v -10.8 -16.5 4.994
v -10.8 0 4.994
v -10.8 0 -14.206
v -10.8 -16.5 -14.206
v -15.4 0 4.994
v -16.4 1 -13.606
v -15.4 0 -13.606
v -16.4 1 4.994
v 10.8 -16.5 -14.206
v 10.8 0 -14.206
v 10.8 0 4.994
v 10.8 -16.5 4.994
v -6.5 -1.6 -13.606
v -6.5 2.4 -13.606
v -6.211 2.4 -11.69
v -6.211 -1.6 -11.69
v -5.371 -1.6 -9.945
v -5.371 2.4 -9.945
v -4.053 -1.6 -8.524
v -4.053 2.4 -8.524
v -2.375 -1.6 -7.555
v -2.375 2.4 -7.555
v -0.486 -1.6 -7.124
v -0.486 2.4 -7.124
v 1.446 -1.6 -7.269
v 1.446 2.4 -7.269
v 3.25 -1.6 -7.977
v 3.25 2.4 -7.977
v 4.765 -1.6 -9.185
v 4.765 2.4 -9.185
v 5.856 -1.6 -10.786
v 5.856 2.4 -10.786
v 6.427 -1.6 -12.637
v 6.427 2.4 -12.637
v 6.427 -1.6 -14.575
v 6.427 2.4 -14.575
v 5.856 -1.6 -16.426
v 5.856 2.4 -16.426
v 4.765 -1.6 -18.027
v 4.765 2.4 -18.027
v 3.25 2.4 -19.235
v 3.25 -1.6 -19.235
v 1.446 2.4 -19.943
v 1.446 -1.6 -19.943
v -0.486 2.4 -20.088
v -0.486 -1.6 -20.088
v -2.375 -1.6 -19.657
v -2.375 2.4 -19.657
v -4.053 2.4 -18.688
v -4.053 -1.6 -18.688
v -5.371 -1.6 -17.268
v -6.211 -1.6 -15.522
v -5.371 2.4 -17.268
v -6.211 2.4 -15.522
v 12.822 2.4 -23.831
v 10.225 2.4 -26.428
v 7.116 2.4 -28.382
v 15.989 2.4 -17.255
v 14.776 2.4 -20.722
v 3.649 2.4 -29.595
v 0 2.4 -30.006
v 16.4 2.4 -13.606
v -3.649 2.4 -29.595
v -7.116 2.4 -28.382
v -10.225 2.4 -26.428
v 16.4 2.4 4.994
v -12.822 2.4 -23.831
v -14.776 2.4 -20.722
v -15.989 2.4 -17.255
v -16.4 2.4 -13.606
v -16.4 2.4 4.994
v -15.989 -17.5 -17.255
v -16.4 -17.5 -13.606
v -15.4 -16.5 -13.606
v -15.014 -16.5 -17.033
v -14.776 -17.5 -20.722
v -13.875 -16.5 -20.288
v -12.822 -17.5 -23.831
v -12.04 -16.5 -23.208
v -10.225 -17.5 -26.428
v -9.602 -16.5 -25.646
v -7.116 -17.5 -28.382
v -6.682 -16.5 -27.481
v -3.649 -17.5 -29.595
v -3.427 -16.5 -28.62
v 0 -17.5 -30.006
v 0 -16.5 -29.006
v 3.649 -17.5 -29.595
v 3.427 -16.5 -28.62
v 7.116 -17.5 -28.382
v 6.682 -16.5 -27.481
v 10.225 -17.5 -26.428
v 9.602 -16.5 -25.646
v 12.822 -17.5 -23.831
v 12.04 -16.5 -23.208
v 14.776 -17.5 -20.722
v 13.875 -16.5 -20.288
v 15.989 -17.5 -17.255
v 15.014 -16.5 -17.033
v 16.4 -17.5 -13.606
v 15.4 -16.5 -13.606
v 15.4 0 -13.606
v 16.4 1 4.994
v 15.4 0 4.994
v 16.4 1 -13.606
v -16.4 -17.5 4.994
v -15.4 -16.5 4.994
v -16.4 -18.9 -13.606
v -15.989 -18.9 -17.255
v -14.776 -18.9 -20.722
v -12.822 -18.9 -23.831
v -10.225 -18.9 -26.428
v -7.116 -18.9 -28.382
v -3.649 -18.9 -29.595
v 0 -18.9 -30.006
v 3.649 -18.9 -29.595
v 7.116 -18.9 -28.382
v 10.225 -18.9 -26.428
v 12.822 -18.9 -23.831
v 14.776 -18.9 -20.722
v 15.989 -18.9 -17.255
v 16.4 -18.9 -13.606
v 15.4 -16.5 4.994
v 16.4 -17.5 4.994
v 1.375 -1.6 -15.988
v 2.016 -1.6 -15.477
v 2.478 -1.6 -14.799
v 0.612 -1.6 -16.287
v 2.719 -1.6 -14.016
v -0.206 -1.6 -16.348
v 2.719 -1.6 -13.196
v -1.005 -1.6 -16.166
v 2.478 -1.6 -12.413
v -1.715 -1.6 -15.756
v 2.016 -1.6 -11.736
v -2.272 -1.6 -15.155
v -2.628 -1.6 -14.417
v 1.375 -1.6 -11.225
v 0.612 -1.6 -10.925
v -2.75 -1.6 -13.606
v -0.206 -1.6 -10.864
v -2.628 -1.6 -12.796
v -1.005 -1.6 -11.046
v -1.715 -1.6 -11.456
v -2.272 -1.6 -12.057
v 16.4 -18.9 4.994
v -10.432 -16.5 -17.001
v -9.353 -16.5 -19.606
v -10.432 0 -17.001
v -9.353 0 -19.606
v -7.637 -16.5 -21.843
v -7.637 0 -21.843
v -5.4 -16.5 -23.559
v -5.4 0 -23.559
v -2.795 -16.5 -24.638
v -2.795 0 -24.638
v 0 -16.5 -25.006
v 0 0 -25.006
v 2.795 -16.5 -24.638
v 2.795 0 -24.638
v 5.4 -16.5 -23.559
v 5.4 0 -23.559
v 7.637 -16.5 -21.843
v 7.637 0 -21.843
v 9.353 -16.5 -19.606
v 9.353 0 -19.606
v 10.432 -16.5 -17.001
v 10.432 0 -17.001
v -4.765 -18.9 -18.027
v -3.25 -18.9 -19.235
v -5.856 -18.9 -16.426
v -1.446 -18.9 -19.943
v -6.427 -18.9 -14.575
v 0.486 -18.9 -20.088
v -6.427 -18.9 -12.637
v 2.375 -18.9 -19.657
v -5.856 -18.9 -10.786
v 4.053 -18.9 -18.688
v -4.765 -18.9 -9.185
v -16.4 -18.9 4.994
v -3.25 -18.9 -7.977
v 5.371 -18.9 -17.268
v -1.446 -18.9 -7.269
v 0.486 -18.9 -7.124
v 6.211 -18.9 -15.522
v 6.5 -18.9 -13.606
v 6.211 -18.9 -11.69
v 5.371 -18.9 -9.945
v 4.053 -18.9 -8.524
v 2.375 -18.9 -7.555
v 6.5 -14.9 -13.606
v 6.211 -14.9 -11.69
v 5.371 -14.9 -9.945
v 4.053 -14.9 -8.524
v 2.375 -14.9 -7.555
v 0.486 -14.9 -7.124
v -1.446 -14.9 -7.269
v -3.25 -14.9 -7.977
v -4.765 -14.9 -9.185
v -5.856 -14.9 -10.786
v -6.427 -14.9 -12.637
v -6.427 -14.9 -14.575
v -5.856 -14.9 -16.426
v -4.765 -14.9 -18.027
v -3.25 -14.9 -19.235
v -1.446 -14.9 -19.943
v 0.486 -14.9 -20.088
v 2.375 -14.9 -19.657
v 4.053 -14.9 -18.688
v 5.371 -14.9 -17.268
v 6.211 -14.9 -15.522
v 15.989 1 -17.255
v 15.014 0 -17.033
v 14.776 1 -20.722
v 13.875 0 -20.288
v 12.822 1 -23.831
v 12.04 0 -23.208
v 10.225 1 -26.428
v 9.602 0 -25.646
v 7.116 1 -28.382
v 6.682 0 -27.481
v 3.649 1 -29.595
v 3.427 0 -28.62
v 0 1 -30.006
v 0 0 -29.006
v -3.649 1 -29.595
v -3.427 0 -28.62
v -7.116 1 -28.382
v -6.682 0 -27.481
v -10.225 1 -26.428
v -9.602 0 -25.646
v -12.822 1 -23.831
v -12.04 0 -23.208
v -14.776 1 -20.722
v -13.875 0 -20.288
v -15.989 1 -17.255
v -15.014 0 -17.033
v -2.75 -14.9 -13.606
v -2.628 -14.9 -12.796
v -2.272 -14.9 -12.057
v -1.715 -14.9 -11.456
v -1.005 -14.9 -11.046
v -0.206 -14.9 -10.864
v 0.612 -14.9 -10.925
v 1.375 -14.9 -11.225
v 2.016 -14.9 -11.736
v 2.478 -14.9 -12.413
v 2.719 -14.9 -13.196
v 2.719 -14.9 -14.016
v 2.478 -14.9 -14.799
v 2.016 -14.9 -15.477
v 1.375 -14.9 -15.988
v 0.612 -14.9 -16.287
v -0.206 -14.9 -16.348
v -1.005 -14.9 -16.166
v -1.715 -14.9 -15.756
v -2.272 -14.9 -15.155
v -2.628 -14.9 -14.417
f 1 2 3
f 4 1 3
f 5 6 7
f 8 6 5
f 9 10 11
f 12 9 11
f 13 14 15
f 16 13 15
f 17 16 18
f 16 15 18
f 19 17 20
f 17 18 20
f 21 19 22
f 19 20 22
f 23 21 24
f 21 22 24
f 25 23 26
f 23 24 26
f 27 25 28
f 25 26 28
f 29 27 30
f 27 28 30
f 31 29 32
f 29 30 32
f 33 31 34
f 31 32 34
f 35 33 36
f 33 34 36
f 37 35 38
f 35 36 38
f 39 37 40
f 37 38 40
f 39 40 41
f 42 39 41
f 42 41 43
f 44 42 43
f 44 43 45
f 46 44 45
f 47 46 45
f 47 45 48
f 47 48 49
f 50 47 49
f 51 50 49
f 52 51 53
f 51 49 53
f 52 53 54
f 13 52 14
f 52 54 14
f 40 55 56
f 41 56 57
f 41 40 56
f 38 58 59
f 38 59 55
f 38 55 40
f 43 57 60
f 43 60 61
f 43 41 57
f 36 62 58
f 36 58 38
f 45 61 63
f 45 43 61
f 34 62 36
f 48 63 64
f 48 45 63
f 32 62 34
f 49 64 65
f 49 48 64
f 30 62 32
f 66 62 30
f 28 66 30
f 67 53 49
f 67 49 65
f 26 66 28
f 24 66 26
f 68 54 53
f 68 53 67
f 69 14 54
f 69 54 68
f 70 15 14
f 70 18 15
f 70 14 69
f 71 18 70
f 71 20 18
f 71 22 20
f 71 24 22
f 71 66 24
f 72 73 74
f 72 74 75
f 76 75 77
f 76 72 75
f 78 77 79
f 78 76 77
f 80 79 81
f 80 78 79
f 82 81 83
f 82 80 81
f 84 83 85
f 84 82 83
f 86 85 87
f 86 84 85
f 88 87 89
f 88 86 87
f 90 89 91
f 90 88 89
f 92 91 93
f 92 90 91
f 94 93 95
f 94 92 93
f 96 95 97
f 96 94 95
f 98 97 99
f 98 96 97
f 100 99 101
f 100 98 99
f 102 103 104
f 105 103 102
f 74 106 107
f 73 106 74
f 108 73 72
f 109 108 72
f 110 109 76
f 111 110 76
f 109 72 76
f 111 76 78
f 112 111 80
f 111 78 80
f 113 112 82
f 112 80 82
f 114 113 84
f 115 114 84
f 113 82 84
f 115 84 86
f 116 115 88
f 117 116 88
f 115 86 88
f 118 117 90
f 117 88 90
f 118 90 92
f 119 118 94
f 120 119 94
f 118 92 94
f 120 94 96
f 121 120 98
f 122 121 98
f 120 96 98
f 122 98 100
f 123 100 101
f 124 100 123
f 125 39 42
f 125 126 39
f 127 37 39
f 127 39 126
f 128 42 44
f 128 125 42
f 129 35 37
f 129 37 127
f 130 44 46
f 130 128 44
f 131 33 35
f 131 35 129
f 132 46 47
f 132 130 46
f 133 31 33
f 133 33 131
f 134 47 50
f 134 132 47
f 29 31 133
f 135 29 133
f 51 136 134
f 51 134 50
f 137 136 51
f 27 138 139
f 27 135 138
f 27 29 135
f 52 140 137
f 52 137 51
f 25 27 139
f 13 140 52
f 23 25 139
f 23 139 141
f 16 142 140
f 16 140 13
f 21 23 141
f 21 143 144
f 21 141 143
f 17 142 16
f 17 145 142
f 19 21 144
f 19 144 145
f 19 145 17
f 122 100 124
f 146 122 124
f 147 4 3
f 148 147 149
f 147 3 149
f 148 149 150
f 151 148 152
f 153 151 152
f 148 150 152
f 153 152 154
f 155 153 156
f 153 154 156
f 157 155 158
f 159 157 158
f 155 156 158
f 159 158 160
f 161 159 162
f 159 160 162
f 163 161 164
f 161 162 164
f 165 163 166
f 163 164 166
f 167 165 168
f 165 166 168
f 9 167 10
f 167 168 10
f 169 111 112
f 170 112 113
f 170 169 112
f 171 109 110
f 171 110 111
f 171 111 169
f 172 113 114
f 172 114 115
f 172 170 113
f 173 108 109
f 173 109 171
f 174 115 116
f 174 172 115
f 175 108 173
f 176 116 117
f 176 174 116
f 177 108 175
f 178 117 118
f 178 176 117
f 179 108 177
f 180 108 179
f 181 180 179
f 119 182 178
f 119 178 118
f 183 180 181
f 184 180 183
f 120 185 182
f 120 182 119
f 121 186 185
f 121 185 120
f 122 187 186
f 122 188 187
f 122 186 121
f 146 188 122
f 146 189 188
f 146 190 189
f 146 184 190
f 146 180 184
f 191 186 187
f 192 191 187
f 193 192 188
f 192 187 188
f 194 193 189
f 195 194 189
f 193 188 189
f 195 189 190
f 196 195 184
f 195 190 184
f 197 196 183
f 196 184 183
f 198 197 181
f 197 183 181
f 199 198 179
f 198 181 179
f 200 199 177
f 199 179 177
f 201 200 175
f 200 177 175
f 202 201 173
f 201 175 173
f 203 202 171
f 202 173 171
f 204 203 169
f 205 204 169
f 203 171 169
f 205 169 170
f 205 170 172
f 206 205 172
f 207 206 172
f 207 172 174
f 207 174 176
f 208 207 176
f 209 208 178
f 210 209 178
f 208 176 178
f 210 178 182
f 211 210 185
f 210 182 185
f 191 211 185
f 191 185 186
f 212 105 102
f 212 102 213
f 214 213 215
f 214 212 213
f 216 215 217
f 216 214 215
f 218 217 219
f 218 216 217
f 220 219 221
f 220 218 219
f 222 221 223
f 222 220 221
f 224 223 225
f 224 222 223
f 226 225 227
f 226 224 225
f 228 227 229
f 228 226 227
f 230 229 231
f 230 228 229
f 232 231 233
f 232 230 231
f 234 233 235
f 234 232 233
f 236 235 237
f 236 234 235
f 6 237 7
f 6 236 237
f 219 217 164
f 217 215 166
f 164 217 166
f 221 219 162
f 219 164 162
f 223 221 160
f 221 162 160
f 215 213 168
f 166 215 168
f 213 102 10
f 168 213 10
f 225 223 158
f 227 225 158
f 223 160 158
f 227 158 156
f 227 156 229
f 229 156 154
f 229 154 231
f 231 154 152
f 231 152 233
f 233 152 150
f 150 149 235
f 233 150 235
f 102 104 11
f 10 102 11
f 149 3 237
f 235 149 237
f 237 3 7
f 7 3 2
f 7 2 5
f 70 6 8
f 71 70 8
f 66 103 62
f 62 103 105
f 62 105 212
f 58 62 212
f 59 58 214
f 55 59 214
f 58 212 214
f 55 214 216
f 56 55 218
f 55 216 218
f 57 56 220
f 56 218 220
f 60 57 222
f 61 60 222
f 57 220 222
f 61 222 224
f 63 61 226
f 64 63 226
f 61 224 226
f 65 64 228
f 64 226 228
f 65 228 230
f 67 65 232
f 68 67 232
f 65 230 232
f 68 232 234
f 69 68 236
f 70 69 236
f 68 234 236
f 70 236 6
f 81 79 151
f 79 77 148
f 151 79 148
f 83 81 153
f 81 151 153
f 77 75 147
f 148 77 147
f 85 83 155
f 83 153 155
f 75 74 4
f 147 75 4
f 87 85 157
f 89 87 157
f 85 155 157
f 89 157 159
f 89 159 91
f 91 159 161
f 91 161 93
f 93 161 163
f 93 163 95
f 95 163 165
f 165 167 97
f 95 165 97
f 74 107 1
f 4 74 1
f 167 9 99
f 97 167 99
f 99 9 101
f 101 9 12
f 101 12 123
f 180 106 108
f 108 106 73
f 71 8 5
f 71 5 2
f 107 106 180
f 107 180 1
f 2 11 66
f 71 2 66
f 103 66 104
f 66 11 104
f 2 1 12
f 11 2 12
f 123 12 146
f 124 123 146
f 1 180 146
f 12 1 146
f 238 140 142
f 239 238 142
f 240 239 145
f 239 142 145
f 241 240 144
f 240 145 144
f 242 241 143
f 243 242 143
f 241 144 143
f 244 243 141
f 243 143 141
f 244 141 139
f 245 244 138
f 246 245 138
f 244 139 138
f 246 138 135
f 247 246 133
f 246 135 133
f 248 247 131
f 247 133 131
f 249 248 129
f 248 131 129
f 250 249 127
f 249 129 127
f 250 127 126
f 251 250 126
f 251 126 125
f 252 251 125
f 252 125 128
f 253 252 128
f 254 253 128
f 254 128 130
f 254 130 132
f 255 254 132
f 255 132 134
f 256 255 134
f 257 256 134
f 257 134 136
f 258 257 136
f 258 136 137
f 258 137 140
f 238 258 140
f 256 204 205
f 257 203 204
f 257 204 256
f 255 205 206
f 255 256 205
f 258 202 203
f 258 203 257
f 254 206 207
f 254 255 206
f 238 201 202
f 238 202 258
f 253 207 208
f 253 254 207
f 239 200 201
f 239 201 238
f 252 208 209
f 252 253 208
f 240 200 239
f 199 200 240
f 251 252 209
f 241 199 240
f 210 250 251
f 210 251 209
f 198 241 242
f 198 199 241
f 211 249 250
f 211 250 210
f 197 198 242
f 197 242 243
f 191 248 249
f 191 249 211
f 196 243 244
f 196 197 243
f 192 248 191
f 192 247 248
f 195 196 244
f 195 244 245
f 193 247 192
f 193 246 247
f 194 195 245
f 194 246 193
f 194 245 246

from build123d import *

# Parameters (mm, degrees)
F1_DEPTH  = 16.5
F3_DEPTH  = 2.4
F5_DEPTH  = 2.4
F6_R      = 2.75
F7_DEPTH  = 21.301
F8_SIZE   = 1
F9_R      = 6.5
F10_DEPTH = 4
F11_R     = 6.5
F12_DEPTH = 4


with BuildPart() as f1:
    # F0 (on Front) → F1 (new body)
    with BuildSketch(Plane.XZ):
        with BuildLine():
            Line((10.8, 4.99389), (-10.8, 4.99389))
            Line((-10.8, 4.99389), (-10.8, -14.20611))
            ThreePointArc((-10.8, -14.20611), (0, -25.00611), (10.8, -14.20611))
            Line((10.8, -14.20611), (10.8, 4.99389))
        make_face()
    extrude(amount=F1_DEPTH)

    # F2 (on face) → F3 (join)
    with BuildSketch(Plane.XZ.offset(16.5)):
        with BuildLine():
            Line((10.8, 4.99389), (10.8, -14.20611))
            ThreePointArc((10.8, -14.20611), (0, -25.00611), (-10.8, -14.20611))
            Line((-10.8, -14.20611), (-10.8, 4.99389))
            Line((-10.8, 4.99389), (-16.4, 4.99389))
            Line((-16.4, 4.99389), (-16.4, -13.60611))
            ThreePointArc((-16.4, -13.60611), (0, -30.00611), (16.4, -13.60611))
            Line((16.4, -13.60611), (16.4, 4.99389))
            Line((16.4, 4.99389), (10.8, 4.99389))
        make_face()
        with BuildLine():
            ThreePointArc((-10.8, -14.20611), (0, -25.00611), (10.8, -14.20611))
            Line((10.8, -14.20611), (10.8, 4.99389))
            Line((10.8, 4.99389), (-10.8, 4.99389))
            Line((-10.8, 4.99389), (-10.8, -14.20611))
        make_face()
    extrude(amount=F3_DEPTH)

    # F4 (on face) → F5 (join)
    with BuildSketch(Plane(origin=(0, 0, 0), x_dir=(-1, 0, 0), z_dir=(0, 1, 0))):
        with BuildLine():
            Line((16.4, 4.99389), (-16.4, 4.99389))
            Line((-16.4, 4.99389), (-16.4, -13.60611))
            ThreePointArc((-16.4, -13.60611), (0, -30.00611), (16.4, -13.60611))
            Line((16.4, -13.60611), (16.4, 4.99389))
        make_face()
    extrude(amount=F5_DEPTH)

    # F6 (on face) → F7 (cut, through all)
    with BuildSketch(Plane(origin=(0, 2.4, 0), x_dir=(-1, 0, 0), z_dir=(0, 1, 0))):
        with Locations((0, -13.60611)):
            Circle(F6_R)
    extrude(amount=-F7_DEPTH, mode=Mode.SUBTRACT)

    # F8
    f8_edges = [f1.edges().sort_by_distance(p)[0] for p in [
        (0, -16.5, -30.00611),
        (0, 0, -30.00611),
    ]]
    chamfer(f8_edges, length=F8_SIZE)

    # F9 (on face) → F10 (cut)
    with BuildSketch(Plane(origin=(0, 2.4, 0), x_dir=(-1, 0, 0), z_dir=(0, 1, 0))):
        with Locations((0, -13.60611)):
            Circle(F9_R)
    extrude(amount=-F10_DEPTH, mode=Mode.SUBTRACT)

    # F11 (on face) → F12 (cut)
    with BuildSketch(Plane.XZ.offset(18.9)):
        with Locations((0, -13.60611)):
            Circle(F11_R)
    extrude(amount=-F12_DEPTH, mode=Mode.SUBTRACT)


solid = f1.part
